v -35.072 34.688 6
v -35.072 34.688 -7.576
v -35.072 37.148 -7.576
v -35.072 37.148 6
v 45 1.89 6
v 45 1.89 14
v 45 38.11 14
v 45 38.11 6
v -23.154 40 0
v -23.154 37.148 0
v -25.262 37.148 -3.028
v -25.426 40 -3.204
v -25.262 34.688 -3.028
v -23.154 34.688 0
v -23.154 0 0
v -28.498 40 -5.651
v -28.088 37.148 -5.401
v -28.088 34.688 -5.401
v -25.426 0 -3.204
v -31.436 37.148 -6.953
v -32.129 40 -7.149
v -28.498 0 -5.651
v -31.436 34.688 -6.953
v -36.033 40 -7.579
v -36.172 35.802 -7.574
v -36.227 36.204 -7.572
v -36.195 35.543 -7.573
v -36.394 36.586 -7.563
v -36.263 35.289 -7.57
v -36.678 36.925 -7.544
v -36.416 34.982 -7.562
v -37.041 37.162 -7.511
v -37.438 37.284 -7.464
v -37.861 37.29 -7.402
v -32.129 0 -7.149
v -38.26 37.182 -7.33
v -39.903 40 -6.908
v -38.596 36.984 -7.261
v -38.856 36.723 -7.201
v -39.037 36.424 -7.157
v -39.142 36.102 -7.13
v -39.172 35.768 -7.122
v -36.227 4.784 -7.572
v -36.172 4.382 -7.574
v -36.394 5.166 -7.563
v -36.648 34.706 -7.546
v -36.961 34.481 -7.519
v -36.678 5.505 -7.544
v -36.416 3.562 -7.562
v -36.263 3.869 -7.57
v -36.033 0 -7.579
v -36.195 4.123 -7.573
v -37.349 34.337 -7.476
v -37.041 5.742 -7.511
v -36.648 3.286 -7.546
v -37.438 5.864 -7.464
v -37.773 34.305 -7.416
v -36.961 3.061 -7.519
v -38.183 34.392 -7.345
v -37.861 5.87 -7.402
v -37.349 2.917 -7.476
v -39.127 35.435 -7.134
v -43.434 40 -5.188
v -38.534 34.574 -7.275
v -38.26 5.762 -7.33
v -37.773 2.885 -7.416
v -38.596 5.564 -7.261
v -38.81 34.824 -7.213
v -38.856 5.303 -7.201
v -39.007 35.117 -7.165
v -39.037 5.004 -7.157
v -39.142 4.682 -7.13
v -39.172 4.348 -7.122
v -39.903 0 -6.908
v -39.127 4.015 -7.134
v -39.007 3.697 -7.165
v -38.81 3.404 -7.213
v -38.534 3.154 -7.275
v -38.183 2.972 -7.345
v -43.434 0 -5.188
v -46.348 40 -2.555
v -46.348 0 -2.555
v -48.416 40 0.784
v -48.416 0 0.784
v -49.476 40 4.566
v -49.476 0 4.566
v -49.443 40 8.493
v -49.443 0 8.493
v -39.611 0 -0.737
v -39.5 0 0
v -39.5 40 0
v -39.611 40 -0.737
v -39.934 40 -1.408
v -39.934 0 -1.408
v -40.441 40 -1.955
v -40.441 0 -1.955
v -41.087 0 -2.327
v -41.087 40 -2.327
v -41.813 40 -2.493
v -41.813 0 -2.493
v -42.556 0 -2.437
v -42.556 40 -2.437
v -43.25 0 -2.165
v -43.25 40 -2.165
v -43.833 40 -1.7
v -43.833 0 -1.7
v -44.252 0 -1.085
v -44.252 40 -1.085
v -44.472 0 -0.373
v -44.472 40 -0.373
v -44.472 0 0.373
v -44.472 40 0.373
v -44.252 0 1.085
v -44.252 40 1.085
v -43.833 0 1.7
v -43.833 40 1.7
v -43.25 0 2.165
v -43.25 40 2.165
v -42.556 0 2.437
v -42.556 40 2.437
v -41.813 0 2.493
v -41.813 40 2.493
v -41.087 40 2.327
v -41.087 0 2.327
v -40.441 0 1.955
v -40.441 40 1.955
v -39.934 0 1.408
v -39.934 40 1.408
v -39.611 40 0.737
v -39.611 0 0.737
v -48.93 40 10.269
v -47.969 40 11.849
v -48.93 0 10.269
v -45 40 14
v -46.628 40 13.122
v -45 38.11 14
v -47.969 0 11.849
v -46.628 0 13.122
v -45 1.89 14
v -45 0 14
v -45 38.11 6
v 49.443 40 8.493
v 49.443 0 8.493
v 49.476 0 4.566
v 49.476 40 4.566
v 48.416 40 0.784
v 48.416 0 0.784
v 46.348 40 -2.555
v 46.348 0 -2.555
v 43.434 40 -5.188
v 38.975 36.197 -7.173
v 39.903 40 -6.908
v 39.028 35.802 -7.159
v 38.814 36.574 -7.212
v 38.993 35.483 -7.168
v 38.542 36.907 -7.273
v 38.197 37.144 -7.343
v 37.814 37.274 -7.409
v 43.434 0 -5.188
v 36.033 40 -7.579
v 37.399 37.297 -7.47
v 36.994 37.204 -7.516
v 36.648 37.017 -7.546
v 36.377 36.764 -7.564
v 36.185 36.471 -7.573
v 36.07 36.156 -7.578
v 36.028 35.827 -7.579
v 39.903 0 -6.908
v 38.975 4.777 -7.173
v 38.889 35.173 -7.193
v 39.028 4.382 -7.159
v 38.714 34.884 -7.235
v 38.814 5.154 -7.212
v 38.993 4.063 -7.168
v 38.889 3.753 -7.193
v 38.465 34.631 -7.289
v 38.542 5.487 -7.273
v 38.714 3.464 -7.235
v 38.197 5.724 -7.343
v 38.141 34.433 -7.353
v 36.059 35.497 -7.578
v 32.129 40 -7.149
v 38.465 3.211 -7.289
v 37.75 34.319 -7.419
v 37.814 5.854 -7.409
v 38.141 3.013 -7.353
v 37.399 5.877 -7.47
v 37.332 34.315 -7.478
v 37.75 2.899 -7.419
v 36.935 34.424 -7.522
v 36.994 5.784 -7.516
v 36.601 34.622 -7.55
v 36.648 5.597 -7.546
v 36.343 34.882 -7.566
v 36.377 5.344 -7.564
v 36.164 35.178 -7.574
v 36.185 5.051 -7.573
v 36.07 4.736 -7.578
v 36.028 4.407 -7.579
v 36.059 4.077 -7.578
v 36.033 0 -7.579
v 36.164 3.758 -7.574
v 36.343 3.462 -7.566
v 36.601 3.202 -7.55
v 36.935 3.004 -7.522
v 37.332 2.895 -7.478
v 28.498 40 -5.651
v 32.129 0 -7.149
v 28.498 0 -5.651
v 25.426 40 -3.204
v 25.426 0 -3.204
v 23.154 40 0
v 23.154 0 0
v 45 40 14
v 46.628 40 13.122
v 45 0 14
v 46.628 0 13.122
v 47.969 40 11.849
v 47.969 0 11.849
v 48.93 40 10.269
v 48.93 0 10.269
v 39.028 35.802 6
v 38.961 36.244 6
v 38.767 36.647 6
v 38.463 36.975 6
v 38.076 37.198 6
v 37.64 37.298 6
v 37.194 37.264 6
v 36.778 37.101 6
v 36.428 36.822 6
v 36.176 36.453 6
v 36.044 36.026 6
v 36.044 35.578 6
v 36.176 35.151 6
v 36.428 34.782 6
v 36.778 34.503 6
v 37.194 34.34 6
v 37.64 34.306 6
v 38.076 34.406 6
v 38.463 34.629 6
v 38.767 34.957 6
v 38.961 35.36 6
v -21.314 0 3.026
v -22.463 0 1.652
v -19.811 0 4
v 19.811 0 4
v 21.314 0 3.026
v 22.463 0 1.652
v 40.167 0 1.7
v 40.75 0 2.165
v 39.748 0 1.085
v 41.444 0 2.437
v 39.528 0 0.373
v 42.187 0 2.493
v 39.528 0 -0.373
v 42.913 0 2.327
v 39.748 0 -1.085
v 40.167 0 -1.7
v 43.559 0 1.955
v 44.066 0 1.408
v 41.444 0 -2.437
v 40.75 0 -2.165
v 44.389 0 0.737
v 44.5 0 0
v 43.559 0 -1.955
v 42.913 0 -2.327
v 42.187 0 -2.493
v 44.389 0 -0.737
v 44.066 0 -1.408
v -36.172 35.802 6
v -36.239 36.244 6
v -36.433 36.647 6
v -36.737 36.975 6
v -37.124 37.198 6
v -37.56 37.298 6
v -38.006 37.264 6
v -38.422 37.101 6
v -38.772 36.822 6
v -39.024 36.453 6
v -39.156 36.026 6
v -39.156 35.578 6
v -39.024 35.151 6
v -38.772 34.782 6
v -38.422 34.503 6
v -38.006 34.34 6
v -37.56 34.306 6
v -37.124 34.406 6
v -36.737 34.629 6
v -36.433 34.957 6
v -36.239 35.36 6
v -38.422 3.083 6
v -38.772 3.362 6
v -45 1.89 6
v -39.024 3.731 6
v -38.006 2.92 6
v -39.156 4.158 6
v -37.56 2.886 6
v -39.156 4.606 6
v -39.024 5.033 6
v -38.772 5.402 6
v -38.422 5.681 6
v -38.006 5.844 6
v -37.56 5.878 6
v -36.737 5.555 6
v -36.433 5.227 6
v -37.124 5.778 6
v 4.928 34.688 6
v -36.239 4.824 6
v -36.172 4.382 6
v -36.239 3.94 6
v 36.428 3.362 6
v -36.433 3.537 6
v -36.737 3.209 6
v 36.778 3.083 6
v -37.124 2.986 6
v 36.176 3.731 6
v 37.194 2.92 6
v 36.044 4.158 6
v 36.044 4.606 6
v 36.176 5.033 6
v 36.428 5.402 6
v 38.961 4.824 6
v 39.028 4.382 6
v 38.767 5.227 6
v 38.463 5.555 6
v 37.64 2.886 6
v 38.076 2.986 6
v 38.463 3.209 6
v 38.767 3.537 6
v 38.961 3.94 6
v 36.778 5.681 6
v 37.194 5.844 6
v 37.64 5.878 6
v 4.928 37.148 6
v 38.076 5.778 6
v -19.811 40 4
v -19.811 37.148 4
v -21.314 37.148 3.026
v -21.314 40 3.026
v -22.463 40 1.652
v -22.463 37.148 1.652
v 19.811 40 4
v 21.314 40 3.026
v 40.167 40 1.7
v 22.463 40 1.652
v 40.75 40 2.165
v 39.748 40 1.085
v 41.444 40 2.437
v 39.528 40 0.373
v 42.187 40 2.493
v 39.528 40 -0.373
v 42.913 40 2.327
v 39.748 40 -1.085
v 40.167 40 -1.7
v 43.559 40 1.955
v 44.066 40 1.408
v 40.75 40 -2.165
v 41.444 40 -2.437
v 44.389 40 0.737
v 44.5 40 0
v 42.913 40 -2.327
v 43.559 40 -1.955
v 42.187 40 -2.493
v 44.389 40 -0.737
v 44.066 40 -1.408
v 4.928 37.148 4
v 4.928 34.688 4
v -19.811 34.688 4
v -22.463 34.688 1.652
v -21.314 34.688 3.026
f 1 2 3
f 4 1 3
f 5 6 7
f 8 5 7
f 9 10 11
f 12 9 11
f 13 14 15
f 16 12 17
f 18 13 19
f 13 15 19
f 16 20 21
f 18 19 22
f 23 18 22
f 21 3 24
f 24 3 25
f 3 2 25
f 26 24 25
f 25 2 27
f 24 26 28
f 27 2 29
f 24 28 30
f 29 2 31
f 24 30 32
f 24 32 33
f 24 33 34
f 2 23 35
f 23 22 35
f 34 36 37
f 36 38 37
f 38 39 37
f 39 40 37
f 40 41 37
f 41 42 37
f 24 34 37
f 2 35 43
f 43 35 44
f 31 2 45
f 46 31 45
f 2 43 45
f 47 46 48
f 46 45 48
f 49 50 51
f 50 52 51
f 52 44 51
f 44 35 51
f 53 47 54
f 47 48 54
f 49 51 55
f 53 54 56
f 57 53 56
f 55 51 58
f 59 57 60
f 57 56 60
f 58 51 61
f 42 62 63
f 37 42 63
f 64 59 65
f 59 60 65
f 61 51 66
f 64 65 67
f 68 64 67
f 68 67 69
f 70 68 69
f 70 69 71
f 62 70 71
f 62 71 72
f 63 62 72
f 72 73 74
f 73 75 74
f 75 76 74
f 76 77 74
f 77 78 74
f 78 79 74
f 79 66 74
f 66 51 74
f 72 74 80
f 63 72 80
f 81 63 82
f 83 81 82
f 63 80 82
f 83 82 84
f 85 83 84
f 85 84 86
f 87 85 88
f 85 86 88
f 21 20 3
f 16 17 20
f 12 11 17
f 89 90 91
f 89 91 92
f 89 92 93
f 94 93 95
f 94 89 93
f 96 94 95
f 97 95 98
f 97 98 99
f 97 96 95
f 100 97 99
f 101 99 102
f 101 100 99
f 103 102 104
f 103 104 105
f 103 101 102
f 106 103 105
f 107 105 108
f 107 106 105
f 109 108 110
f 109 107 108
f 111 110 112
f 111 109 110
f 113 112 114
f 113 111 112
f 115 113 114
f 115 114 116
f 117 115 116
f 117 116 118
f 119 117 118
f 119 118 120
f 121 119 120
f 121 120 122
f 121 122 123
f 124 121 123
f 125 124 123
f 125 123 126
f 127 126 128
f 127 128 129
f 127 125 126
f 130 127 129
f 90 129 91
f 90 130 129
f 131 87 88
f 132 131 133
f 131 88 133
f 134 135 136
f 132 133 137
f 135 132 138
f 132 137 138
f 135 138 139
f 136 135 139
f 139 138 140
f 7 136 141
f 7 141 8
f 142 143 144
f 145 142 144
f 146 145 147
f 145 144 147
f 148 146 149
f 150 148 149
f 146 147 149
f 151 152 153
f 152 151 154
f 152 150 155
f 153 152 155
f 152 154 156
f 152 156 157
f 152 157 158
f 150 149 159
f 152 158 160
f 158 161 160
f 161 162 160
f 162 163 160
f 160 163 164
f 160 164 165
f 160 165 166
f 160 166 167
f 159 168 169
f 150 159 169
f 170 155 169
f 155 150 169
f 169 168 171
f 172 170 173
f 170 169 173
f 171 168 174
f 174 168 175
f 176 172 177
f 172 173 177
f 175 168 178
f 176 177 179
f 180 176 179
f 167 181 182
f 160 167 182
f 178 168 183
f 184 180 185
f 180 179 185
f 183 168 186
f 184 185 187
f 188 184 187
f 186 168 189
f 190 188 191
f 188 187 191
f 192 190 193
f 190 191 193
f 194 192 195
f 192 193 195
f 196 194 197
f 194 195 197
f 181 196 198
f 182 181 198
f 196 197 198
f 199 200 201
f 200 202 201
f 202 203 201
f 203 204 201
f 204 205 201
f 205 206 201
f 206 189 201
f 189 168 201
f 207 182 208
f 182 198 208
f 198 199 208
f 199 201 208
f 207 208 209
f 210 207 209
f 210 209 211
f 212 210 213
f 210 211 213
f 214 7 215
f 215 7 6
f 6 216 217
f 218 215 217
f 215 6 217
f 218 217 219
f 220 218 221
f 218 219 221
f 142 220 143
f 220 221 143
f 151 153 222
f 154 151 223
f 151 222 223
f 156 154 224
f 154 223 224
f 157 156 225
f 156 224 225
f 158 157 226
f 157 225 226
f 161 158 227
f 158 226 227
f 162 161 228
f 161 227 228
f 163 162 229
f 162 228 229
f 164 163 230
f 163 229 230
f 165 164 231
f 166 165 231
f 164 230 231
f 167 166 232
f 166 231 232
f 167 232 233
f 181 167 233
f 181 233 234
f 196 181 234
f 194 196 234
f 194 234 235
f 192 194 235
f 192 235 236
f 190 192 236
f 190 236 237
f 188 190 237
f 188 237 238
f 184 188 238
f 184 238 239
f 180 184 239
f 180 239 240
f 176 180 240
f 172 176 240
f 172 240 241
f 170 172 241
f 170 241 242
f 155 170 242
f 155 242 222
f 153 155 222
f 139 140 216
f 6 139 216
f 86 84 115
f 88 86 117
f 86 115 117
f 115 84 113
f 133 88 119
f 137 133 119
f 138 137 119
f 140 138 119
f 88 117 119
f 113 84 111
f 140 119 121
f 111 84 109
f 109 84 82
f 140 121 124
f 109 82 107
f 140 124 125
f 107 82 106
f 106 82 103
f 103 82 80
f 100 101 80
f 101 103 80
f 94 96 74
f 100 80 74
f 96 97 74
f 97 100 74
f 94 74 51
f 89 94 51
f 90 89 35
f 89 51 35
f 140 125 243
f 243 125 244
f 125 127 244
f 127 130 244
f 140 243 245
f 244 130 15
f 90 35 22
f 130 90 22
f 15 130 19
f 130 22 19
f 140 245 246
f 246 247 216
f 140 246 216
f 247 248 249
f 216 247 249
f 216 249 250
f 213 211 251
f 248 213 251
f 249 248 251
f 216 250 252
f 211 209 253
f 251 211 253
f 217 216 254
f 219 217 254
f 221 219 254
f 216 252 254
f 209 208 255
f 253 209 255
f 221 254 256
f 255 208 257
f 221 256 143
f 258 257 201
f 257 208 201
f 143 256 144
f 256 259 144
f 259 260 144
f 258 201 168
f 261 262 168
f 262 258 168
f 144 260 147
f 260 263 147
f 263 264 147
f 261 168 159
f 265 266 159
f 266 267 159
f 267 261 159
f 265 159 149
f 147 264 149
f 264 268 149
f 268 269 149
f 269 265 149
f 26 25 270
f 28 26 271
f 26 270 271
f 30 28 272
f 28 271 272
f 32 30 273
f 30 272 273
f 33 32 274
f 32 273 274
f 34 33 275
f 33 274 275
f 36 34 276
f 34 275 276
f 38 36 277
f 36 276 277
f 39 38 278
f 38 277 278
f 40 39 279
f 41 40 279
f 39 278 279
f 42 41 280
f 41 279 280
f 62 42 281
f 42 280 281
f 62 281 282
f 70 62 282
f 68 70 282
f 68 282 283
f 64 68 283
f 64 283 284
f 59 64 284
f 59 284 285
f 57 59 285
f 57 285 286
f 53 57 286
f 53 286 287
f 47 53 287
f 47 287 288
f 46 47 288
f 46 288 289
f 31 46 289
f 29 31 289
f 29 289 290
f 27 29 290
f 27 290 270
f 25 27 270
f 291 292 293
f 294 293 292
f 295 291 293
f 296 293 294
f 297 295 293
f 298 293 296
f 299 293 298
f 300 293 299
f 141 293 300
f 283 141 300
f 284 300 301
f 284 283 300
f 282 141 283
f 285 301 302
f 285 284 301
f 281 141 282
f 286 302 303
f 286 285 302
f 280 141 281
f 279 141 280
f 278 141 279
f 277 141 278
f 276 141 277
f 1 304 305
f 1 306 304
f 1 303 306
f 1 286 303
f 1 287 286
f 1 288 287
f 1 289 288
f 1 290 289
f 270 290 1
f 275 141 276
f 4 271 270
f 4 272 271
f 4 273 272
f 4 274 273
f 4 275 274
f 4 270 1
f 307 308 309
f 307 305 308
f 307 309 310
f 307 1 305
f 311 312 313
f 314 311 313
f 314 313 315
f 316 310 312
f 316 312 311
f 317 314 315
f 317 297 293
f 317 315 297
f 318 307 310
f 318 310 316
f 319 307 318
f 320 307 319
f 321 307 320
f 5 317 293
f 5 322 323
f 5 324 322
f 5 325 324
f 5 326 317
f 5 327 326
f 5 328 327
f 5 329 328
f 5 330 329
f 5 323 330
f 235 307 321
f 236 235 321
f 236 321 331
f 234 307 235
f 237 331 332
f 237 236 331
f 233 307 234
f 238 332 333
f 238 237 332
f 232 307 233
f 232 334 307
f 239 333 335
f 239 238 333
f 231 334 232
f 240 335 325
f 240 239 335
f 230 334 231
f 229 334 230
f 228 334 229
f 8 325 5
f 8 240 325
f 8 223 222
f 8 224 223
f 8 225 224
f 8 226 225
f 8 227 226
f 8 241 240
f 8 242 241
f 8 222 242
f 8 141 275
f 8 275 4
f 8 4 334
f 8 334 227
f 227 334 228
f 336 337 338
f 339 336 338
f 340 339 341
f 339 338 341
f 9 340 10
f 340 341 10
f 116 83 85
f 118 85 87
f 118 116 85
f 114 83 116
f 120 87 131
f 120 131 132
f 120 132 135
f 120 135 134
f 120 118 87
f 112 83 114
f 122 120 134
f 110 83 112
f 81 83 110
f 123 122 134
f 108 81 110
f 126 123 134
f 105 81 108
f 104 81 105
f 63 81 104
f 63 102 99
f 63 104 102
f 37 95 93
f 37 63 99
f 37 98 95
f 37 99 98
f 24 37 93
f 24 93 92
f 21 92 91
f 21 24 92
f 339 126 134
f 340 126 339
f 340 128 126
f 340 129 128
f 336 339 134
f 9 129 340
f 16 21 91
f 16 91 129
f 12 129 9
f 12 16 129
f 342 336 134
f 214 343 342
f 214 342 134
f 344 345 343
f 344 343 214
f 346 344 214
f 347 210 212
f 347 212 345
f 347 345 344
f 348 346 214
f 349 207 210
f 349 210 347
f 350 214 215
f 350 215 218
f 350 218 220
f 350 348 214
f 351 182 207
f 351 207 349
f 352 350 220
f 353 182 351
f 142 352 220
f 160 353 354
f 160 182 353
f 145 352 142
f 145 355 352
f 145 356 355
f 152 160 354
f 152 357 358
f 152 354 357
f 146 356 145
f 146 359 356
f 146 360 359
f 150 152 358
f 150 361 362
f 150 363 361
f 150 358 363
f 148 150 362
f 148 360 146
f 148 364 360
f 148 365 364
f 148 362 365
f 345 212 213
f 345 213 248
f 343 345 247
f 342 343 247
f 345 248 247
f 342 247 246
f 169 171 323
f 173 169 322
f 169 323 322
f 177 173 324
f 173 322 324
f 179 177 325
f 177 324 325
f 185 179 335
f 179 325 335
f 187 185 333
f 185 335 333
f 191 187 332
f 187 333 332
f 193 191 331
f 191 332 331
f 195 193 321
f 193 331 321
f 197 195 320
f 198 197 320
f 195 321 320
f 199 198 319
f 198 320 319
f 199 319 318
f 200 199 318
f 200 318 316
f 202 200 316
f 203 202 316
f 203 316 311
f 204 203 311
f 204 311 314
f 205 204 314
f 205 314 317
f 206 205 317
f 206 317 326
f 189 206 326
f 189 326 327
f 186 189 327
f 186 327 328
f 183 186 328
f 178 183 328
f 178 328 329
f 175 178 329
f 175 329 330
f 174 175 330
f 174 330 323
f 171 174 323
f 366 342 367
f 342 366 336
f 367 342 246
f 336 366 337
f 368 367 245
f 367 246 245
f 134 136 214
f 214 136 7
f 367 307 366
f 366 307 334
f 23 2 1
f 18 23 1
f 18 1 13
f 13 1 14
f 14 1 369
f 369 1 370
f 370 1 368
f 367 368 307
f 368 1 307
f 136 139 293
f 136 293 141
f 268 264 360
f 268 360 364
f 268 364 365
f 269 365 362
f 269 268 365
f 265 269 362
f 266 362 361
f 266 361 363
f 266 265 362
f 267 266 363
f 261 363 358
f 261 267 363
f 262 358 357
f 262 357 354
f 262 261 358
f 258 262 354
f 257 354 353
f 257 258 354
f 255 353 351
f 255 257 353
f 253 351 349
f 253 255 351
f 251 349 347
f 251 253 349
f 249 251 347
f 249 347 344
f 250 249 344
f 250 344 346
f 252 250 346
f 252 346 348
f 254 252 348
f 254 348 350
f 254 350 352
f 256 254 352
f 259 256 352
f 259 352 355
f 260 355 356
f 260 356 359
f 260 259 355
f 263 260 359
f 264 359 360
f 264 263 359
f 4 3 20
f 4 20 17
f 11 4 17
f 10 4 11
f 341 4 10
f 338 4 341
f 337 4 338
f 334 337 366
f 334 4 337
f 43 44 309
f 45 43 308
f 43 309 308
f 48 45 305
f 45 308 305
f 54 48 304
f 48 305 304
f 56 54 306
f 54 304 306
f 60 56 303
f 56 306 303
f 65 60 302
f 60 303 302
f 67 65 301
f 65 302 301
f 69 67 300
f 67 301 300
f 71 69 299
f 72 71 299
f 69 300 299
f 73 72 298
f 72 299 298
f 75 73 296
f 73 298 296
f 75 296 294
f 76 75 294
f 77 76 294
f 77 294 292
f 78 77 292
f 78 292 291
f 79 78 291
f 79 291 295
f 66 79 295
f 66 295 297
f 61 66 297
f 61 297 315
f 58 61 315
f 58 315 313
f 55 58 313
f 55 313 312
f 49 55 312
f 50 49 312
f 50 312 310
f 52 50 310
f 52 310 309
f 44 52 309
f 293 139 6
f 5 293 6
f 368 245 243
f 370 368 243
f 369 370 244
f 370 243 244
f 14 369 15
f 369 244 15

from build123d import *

# Parameters (mm, degrees)
SKETCH1_R           = 2.5
BOSS_EXTRUDE2_DEPTH = 40
SKETCH3_W           = 90
SKETCH3_H           = 36.22
SKETCH3_R           = 1.5
SKETCH3_W_2         = 40
SKETCH3_H_2         = 2.46
CUT_EXTRUDE1_DEPTH  = 8
SKETCH3_5_W         = 40
SKETCH3_5_H         = 2.46
SKETCH3_5_R         = 1.5
CUT_EXTRUDE3_DEPTH  = 22.585745164


with BuildPart() as part:
    # Sketch1 → Boss-Extrude2 (new body)
    with BuildSketch(Plane(origin=(0, 0, 0), x_dir=(1, 0, 0), z_dir=(0, 1, 0))):
        with BuildLine():
            Line((-45, -14), (45, -14))
            ThreePointArc((45, -14), (47.968786967, -11.849318779), (49.443427998, -8.493047098))
            ThreePointArc((49.443427998, -8.493047098), (39.902505959, 6.907779255), (23.154454386, 0))
            ThreePointArc((23.154454386, 0), (21.939767311, -2.382145151), (19.810770857, -4))
            Line((19.810770857, -4), (-19.810770857, -4))
            ThreePointArc((-19.810770857, -4), (-21.939767311, -2.382145151), (-23.154454386, 0))
            ThreePointArc((-23.154454386, 0), (-39.902505959, 6.907779255), (-49.443427998, -8.493047098))
            ThreePointArc((-49.443427998, -8.493047098), (-47.968786967, -11.849318779), (-45, -14))
        make_face()
        with Locations((-42, 0)):
            Circle(SKETCH1_R, mode=Mode.SUBTRACT)
        with Locations((42, 0)):
            Circle(SKETCH1_R, mode=Mode.SUBTRACT)
    extrude(amount=BOSS_EXTRUDE2_DEPTH)

    # Sketch3 → Cut-Extrude1 (cut)
    with BuildSketch(Plane.XY.offset(14)):
        with Locations((0, 20)):
            Rectangle(SKETCH3_W, SKETCH3_H)
        with Locations((37.527569226, 35.802060635)):
            Circle(SKETCH3_R, mode=Mode.SUBTRACT)
        with Locations((-37.672430774, 35.802060635)):
            Circle(SKETCH3_R, mode=Mode.SUBTRACT)
        with Locations((-37.672430774, 4.382060635)):
            Circle(SKETCH3_R, mode=Mode.SUBTRACT)
        with Locations((37.527569226, 4.382060635)):
            Circle(SKETCH3_R, mode=Mode.SUBTRACT)
        with Locations((-15.072430774, 35.917939365)):
            Rectangle(SKETCH3_W_2, SKETCH3_H_2, mode=Mode.SUBTRACT)
    extrude(amount=-CUT_EXTRUDE1_DEPTH, mode=Mode.SUBTRACT)

    # Sketch3<5> → Cut-Extrude3 (cut, through all)
    with BuildSketch(Plane.XY.offset(14)):
        with Locations((-15.072430774, 35.917939365)):
            Rectangle(SKETCH3_5_W, SKETCH3_5_H)
        with Locations((-37.672430774, 35.802060635)):
            Circle(SKETCH3_5_R)
        with Locations((-37.672430774, 4.382060635)):
            Circle(SKETCH3_5_R)
        with Locations((37.527569226, 4.382060635)):
            Circle(SKETCH3_5_R)
        with Locations((37.527569226, 35.802060635)):
            Circle(SKETCH3_5_R)
    extrude(amount=-CUT_EXTRUDE3_DEPTH, mode=Mode.SUBTRACT)


solid = part.part
